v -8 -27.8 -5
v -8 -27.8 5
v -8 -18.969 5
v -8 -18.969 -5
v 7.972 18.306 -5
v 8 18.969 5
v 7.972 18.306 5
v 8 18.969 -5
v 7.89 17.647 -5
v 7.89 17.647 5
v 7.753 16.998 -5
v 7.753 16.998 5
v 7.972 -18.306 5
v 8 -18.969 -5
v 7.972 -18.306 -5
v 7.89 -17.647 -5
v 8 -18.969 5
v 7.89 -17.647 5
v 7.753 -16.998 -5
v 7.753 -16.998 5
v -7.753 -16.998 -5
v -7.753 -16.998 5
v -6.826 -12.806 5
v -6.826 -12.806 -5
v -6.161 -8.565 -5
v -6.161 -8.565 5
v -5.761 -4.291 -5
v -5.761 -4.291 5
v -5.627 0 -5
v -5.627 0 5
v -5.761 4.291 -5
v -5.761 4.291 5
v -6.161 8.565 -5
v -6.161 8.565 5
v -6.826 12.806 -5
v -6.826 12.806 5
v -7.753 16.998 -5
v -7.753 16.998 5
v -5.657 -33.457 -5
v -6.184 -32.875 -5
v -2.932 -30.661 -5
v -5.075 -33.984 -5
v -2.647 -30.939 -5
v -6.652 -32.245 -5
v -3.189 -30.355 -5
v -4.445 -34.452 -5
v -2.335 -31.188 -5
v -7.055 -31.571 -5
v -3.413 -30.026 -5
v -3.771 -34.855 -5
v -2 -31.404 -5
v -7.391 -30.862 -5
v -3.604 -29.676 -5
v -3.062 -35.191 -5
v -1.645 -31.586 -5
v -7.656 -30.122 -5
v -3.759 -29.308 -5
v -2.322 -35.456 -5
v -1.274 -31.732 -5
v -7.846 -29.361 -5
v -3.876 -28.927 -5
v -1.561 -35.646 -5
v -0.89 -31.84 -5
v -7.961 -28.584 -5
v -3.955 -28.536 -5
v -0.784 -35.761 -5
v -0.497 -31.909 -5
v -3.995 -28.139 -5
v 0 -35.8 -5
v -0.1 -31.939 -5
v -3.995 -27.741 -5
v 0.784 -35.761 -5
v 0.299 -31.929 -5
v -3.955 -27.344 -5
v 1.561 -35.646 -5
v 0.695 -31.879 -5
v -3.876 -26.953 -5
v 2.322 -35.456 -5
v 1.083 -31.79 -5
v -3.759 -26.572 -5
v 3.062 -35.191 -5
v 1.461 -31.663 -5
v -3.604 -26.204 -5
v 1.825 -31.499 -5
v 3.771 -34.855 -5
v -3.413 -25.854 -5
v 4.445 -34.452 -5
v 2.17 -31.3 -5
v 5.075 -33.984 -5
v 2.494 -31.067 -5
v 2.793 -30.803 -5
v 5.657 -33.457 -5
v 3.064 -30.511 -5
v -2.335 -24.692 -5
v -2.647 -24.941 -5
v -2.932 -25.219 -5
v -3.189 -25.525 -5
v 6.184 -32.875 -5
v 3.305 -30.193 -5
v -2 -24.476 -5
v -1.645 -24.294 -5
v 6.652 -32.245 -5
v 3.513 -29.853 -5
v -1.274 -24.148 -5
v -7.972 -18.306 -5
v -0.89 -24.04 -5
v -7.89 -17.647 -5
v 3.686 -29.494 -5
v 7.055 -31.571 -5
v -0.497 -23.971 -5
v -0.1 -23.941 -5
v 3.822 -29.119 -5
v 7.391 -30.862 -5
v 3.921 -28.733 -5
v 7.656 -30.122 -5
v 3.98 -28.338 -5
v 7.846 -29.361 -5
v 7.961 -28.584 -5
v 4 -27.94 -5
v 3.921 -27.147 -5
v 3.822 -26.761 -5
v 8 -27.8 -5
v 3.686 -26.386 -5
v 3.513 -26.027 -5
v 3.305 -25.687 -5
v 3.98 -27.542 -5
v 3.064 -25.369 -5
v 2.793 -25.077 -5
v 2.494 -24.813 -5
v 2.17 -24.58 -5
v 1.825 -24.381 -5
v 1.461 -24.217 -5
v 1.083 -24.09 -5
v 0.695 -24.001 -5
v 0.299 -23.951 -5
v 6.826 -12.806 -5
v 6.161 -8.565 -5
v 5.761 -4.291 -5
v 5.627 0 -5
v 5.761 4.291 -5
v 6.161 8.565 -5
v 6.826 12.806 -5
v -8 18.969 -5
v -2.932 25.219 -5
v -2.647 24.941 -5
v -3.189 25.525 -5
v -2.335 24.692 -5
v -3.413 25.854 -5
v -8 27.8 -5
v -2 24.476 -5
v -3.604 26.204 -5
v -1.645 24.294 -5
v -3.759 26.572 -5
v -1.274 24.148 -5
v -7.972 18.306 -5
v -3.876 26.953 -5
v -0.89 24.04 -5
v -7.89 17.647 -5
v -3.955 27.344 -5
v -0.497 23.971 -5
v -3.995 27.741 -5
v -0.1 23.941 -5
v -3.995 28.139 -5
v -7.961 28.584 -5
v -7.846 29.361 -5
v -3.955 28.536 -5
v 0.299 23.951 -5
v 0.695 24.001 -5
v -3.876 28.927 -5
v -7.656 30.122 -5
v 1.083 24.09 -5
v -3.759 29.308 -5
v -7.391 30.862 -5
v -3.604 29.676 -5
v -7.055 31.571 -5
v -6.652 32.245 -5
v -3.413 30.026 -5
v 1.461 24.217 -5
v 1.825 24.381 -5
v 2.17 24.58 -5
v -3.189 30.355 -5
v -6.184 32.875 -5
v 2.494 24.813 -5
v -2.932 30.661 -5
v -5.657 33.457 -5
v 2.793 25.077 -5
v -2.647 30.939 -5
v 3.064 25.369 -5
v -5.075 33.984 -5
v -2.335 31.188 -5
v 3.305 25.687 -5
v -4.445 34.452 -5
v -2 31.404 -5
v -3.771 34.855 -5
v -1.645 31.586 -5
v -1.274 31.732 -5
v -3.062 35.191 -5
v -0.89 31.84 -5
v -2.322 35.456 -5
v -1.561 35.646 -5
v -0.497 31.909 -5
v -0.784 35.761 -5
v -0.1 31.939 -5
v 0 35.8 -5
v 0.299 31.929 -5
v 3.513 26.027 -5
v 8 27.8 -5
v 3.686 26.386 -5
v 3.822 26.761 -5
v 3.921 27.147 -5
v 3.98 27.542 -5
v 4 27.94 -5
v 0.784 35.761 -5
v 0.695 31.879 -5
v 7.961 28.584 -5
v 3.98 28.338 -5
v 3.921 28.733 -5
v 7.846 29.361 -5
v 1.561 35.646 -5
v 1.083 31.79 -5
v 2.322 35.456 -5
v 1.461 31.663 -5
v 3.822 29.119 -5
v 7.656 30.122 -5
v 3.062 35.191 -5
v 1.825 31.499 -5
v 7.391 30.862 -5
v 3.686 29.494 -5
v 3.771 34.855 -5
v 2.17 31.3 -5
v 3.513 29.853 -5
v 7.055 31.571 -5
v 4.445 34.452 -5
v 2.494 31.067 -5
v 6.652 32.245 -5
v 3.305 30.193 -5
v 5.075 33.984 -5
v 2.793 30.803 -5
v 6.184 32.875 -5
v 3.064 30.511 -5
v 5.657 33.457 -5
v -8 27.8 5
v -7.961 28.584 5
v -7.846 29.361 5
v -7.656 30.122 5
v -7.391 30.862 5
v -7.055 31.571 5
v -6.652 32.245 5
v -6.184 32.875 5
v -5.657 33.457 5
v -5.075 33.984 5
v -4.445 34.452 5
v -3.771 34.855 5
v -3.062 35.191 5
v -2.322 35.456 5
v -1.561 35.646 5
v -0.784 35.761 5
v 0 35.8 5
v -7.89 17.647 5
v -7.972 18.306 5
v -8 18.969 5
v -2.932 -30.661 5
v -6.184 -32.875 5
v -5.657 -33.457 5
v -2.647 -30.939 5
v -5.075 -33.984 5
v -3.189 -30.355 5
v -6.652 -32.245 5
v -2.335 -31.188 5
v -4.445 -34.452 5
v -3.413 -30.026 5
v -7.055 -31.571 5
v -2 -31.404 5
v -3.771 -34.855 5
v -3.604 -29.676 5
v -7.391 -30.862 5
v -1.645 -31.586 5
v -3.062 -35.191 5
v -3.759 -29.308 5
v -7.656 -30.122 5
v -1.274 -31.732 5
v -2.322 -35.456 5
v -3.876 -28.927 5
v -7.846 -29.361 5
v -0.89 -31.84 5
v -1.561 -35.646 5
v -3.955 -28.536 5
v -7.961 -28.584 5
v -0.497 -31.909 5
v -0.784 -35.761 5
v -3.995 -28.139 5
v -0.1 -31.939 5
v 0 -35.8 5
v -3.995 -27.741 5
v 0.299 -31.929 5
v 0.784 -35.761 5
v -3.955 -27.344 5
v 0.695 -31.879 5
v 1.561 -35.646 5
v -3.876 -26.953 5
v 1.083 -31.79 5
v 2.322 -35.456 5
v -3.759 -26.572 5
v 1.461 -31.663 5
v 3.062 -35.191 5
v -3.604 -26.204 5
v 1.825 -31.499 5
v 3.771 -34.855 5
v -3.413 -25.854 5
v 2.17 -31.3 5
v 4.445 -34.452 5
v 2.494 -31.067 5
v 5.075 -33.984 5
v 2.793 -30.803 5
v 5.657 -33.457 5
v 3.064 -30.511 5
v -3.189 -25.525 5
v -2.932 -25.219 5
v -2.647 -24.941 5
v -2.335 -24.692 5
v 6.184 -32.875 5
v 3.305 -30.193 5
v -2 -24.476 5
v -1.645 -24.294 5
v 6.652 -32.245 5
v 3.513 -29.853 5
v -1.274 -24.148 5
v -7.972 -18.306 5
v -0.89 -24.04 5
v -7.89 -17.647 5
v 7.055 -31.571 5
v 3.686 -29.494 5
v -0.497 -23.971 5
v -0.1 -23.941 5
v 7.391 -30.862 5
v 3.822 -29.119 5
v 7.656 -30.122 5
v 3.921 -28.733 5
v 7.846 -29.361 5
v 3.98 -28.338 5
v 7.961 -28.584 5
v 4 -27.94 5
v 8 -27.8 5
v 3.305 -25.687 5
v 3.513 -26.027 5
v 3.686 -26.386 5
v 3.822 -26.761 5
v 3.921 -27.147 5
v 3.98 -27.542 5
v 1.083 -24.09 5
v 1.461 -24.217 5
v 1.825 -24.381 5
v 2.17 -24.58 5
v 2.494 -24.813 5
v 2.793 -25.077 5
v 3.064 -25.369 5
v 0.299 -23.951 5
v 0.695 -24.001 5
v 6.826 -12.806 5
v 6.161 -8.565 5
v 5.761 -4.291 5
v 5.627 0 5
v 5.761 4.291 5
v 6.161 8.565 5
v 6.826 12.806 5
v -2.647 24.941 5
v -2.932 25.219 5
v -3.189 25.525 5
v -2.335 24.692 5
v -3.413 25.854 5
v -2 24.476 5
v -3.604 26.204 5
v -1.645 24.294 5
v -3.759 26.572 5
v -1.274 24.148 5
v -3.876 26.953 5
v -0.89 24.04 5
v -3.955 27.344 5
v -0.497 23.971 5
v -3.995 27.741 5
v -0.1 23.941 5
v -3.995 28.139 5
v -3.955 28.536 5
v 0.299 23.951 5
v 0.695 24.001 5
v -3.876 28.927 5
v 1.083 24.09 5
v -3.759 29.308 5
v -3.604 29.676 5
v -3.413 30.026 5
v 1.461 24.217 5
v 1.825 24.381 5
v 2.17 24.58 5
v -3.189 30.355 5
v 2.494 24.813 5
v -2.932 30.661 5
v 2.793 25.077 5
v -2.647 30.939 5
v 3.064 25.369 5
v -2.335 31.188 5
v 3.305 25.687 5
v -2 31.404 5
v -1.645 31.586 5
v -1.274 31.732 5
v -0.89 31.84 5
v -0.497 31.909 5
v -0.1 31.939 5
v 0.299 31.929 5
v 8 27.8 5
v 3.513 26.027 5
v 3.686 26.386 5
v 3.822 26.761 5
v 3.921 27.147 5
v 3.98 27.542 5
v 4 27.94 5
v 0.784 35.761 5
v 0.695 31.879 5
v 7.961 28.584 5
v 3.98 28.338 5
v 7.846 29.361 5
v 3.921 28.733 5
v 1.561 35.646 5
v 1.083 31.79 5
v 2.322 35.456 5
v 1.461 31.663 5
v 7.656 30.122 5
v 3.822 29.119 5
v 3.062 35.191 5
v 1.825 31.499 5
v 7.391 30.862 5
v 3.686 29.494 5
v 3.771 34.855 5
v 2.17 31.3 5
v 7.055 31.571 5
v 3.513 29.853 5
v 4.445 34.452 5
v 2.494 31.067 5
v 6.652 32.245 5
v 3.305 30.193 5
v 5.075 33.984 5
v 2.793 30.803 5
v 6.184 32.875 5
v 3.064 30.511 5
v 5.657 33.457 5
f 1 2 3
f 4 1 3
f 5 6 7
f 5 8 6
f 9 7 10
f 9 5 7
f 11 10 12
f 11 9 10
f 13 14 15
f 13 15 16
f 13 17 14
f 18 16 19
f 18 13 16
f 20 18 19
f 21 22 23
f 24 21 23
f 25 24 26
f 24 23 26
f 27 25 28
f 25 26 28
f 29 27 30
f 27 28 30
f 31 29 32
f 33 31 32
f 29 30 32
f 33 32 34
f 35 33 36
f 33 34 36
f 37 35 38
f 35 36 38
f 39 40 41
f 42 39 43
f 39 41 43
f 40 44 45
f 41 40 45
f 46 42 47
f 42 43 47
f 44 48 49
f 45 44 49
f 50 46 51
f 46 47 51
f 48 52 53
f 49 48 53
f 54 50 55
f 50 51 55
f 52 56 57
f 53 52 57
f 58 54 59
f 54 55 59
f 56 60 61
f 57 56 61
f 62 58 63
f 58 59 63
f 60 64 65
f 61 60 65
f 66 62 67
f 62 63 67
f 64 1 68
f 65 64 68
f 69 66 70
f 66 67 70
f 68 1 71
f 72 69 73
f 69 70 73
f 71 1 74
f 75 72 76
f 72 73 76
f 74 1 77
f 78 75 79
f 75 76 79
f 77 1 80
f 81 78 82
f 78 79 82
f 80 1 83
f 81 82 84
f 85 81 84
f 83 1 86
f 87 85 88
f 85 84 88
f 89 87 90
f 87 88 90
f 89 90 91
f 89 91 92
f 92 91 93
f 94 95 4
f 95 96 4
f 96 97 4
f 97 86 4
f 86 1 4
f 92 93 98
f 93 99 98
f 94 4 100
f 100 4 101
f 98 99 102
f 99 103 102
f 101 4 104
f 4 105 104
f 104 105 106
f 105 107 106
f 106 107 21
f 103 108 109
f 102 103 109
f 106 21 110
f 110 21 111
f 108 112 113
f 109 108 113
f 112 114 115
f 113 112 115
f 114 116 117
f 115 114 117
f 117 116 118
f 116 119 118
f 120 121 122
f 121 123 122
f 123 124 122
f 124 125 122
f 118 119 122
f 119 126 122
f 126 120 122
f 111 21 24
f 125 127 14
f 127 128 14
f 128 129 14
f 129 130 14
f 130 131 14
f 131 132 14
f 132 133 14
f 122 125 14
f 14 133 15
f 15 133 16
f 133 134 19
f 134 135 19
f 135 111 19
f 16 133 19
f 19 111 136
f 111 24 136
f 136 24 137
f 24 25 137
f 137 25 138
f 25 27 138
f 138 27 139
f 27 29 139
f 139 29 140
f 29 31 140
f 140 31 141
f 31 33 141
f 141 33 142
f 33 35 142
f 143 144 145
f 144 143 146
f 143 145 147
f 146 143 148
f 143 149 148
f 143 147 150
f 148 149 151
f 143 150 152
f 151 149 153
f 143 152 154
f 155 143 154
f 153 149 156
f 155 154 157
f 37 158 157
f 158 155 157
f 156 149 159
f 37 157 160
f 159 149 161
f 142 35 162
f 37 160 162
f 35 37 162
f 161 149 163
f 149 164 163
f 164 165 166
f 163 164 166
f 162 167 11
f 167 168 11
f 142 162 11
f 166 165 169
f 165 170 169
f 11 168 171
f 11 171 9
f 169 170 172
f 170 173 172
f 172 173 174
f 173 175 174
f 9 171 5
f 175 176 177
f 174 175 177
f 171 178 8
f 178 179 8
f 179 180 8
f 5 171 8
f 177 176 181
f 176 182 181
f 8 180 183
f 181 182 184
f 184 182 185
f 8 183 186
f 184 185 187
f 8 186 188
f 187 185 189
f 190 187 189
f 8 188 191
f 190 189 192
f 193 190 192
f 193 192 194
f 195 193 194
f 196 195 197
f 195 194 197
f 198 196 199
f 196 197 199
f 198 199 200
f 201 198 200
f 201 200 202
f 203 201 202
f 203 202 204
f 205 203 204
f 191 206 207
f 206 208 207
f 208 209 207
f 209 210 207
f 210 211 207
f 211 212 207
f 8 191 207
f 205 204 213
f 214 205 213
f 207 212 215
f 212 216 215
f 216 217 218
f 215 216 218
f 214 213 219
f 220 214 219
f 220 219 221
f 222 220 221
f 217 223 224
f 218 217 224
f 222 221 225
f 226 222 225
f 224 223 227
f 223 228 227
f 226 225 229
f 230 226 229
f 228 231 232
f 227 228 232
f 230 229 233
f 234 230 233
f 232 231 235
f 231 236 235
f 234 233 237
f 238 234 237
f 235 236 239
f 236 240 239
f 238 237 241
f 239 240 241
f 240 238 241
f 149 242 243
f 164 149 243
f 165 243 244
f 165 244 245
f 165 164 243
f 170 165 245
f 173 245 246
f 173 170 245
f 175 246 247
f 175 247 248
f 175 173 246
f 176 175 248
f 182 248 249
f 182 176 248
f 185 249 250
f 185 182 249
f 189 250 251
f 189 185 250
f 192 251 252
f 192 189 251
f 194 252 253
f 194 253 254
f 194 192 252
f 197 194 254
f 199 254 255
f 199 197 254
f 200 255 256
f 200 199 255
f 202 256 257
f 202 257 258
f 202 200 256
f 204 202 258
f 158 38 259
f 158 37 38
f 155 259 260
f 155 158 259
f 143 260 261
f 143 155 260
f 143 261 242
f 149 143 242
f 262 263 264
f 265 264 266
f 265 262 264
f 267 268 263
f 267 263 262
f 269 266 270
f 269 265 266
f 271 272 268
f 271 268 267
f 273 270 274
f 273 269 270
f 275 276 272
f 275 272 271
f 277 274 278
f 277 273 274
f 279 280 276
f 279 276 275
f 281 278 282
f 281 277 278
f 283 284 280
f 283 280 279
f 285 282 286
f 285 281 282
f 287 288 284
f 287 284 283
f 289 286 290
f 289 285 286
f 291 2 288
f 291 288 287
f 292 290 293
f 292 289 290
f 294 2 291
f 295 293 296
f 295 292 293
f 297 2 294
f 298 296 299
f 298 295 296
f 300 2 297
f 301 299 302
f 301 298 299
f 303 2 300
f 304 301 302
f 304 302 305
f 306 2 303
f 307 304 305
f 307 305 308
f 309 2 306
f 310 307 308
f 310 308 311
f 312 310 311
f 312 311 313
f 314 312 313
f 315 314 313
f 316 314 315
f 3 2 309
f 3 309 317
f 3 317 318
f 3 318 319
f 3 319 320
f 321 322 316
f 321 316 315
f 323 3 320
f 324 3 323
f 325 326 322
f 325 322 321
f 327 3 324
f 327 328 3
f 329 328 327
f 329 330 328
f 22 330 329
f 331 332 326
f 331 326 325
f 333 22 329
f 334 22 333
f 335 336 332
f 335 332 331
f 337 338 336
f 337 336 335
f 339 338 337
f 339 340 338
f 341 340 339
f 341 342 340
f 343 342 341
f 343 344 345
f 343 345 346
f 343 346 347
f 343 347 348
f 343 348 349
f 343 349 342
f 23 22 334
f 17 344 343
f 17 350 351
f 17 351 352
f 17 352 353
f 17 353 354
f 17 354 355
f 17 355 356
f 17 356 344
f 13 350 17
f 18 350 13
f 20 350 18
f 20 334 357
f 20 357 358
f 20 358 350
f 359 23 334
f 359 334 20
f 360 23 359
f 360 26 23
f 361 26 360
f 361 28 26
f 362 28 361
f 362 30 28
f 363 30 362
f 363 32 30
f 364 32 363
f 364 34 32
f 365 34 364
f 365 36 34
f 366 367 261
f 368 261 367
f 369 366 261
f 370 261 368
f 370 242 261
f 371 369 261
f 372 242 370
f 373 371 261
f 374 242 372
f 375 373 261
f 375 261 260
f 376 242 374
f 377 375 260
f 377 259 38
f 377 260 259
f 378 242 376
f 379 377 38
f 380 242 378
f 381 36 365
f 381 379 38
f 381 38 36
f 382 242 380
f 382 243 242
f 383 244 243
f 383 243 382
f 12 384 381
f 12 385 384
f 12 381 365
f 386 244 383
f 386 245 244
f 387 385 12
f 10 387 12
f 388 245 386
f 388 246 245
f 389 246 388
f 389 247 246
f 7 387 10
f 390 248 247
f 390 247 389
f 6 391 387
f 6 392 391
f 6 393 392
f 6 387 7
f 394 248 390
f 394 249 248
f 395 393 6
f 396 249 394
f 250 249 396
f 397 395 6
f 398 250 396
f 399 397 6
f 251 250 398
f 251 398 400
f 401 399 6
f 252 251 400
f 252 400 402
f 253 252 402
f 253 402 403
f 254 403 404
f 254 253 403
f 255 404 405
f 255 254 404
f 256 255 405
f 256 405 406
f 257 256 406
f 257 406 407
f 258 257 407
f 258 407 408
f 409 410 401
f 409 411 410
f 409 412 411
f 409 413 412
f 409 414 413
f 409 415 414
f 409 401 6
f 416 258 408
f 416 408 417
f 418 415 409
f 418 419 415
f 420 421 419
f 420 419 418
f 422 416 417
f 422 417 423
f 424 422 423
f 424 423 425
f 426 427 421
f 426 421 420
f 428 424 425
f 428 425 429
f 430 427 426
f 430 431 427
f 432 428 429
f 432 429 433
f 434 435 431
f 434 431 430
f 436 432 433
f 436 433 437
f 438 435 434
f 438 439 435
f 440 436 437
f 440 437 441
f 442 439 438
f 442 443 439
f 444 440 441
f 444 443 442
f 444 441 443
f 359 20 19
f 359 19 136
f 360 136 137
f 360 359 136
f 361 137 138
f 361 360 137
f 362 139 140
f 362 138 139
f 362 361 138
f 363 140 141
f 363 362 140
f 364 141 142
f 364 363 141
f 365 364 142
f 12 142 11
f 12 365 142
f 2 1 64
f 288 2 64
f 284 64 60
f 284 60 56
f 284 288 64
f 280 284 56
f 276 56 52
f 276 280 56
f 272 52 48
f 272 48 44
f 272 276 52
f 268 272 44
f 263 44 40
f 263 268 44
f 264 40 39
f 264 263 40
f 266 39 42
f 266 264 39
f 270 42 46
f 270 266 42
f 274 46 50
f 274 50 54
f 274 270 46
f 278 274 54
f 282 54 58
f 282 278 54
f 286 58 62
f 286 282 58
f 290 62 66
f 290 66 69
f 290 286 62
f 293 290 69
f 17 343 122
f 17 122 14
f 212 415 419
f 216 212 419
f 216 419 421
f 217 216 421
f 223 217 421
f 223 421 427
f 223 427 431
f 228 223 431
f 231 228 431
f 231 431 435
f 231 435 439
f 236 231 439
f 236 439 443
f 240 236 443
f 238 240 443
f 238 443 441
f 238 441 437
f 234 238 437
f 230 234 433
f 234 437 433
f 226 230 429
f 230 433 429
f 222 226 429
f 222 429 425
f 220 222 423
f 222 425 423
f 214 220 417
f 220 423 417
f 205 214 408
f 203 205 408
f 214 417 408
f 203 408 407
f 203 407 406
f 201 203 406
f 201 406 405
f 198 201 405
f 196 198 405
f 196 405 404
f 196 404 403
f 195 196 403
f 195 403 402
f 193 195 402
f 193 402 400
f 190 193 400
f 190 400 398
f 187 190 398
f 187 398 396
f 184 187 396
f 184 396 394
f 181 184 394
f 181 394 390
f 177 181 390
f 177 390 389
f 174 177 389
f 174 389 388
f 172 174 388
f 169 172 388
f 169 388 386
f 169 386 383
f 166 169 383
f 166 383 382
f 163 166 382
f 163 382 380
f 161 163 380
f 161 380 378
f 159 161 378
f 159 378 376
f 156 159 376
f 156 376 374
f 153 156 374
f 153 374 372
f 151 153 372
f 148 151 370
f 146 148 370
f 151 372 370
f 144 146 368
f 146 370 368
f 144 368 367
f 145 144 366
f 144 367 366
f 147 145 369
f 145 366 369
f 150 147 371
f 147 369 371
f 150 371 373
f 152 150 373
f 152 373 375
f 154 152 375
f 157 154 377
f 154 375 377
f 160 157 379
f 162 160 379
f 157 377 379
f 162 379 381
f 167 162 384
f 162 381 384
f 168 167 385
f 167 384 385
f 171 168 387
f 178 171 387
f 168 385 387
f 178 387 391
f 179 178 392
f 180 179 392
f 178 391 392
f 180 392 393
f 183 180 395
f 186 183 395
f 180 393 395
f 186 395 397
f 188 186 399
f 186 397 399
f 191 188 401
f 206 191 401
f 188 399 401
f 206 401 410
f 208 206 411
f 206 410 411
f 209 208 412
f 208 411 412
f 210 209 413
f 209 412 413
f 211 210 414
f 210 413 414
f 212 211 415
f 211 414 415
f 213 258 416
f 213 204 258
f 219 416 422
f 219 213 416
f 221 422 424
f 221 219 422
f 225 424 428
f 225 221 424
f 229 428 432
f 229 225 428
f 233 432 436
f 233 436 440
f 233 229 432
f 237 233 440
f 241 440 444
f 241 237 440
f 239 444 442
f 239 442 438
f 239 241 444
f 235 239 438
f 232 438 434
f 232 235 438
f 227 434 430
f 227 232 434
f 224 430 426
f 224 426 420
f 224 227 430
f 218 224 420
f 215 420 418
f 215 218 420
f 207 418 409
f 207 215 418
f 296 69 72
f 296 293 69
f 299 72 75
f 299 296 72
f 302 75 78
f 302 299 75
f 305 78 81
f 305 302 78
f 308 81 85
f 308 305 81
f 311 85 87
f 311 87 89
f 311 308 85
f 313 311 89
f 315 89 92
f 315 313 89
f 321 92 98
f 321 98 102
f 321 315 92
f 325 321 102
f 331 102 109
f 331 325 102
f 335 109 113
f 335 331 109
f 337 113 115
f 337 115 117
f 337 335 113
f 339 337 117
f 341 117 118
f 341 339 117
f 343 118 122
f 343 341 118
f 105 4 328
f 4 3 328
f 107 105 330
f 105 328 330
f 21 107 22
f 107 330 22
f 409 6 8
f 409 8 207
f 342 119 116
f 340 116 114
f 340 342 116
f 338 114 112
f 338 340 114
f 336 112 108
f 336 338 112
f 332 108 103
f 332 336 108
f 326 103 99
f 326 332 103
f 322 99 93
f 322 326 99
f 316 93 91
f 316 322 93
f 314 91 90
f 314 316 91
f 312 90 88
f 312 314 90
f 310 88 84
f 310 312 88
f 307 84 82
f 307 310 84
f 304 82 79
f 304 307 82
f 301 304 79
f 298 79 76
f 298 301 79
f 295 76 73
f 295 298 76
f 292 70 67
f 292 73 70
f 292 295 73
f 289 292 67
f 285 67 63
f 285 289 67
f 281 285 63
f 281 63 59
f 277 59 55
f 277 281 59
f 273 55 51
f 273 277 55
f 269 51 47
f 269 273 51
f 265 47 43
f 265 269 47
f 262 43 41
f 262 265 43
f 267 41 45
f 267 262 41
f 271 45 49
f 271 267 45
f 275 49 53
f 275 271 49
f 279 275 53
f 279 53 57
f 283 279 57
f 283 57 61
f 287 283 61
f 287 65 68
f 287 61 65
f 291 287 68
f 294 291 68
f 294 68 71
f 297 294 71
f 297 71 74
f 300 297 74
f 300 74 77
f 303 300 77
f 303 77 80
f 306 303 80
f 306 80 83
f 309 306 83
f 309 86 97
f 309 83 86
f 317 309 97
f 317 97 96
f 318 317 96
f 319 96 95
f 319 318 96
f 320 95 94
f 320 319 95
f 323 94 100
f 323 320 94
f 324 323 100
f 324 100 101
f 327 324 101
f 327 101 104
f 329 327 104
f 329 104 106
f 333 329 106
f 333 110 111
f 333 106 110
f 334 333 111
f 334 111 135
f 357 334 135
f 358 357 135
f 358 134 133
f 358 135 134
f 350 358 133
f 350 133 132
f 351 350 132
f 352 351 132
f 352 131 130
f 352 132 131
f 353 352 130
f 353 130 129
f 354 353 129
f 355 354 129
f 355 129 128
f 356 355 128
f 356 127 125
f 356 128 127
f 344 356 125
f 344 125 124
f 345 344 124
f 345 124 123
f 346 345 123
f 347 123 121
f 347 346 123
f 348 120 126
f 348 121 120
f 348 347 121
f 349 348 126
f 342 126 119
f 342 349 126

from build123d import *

# Parameters (mm, degrees)
SKETCH1_W          = 16
SKETCH1_H          = 71.6
BODY_DEPTH         = 5
SKETCH2_R          = 4
TOP_HOLE_DEPTH     = 39.021572824
CUT_EXTRUDE1_DEPTH = 39.021572824
FILLET1_R          = 8


with BuildPart() as part:
    # Sketch1 → Body (new, symmetric)
    with BuildSketch(Plane.XY):
        Rectangle(SKETCH1_W, SKETCH1_H)
    extrude(amount=BODY_DEPTH, both=True)

    # Sketch2 → Top Hole (cut, through all)
    with BuildSketch(Plane.XY.offset(5)):
        with Locations((0, 27.94)):
            Circle(SKETCH2_R)
    top_hole = extrude(amount=-TOP_HOLE_DEPTH, mode=Mode.SUBTRACT)

    # Bottom Hole: Top Hole across plane
    add(top_hole.mirror(Plane.ZX), mode=Mode.SUBTRACT)

    # Sketch3 → Cut-Extrude1 (cut, symmetric)
    with BuildSketch(Plane.XY.offset(5)):
        with BuildLine():
            Line((-8, 17.94), (-8, -17.94))
            ThreePointArc((-8, -17.94), (-5.626994529, 0), (-8, 17.94))
        make_face()
    cut_extrude1 = extrude(amount=CUT_EXTRUDE1_DEPTH, both=True, mode=Mode.SUBTRACT)

    # Mirror1: Cut-Extrude1 across plane
    add(cut_extrude1.mirror(Plane(origin=(0, 0, 0), x_dir=(0, 0, 1), z_dir=(1, 0, 0))), mode=Mode.SUBTRACT)

    # Fillet1
    fillet1_edges = [part.edges().sort_by_distance(p)[0] for p in [
        (8, -35.8, 0),
        (-8, -35.8, 0),
        (8, 35.8, 0),
        (-8, 35.8, 0),
        (-8, 17.94, 0),
        (-8, -17.94, 0),
        (8, -17.94, 0),
        (8, 17.94, 0),
    ]]
    fillet(fillet1_edges, radius=FILLET1_R - 0.0001)  # a hair under: the kernel refuses the full size


solid = part.part
